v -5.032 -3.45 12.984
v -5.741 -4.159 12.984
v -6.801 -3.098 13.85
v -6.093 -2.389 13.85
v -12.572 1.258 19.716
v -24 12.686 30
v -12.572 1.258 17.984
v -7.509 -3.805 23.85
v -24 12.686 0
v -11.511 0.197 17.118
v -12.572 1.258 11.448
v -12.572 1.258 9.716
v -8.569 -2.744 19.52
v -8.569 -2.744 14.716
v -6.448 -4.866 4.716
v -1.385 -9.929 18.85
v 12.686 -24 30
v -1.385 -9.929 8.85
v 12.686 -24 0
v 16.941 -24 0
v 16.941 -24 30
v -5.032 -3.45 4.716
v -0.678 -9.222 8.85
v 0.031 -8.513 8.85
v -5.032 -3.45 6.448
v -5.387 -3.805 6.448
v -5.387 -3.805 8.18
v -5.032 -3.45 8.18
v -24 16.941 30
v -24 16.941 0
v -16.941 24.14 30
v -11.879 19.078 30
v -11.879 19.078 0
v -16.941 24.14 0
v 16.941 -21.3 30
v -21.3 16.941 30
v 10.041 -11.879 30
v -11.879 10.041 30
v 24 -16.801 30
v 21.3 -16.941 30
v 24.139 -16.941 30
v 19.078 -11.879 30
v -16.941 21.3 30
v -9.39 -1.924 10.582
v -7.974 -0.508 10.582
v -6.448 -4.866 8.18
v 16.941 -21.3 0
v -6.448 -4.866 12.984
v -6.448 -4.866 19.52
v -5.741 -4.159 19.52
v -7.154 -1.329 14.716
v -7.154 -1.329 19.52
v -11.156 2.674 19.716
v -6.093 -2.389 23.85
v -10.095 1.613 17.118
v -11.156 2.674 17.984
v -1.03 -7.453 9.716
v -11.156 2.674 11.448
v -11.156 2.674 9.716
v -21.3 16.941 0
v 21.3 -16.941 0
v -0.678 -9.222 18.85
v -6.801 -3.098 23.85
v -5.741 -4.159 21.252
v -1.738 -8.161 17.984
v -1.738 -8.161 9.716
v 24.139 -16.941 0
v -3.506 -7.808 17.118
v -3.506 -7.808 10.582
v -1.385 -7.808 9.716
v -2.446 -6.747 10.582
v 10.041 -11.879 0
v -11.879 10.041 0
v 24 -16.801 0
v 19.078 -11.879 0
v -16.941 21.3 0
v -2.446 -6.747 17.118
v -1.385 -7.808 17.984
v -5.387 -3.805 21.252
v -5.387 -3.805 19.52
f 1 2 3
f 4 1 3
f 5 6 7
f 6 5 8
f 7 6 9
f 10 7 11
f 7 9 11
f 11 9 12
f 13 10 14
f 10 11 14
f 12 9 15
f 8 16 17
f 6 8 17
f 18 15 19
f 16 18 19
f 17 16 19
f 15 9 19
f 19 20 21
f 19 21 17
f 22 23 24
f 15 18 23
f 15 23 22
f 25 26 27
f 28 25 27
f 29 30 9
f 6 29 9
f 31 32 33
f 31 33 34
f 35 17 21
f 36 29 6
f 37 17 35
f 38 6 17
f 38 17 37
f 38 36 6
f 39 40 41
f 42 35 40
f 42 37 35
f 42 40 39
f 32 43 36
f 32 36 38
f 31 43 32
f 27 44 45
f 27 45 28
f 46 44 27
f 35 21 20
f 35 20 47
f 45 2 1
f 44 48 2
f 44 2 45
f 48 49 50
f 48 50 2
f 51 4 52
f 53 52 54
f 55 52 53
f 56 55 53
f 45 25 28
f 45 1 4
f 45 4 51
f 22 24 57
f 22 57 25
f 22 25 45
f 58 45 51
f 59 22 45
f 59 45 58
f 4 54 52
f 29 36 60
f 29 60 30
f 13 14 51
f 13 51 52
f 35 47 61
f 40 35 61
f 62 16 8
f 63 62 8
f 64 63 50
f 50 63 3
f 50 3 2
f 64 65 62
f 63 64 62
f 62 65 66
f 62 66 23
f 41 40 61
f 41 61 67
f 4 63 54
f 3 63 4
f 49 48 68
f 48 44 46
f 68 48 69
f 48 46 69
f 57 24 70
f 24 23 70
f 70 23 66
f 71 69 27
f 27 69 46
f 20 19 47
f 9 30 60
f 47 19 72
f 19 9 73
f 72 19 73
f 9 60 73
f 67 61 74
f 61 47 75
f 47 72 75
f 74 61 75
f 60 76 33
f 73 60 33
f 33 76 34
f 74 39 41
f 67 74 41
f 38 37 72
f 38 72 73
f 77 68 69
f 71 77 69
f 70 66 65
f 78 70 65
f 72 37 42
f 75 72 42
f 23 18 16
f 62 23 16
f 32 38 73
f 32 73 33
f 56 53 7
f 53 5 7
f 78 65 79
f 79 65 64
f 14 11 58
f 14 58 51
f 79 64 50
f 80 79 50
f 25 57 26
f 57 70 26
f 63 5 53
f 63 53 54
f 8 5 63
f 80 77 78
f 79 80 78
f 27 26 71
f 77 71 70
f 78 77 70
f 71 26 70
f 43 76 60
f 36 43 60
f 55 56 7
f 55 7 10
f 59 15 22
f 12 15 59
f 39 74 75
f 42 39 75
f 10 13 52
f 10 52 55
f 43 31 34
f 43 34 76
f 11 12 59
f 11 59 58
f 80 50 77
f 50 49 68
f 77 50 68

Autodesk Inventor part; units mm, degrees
ref_plane "YZ Plane" through (0, 0, 0) normal (1, 0, 0) x (0, 1, 0)
ref_plane "XZ Plane" through (0, 0, 0) normal (0, 1, 0) x (-1, 0, 0)
sketch "Sketch1" plane through (0, 0, 0) normal (0, 0, 1) x (1, 0, 0)
  line L0 (-16.8009, 21.2415) -> (21.2415, -16.8009)
  line L1 (21.2415, -16.8009) -> (16.8009, -21.2415)
  line L2 (16.8009, -21.2415) -> (-21.2415, 16.8009)
  line L3 (-21.2415, 16.8009) -> (-16.8009, 21.2415)
  line L4 (-16.8009, 21.2415) -> (16.8009, -21.2415) construction
  line L5 (21.2415, -16.8009) -> (-21.2415, 16.8009) construction
  line L6 (-16.8009, 21.2415) -> (36.9991, 21.2415) construction
  line L7 (-21.2415, 16.8009) -> (-24, 16.8009)
  line L8 (16.8009, -21.2415) -> (16.8009, -24)
  line L9 (16.8009, -24) -> (-24, 16.8009)
  line L10 (-16.8009, 21.2415) -> (-16.8009, 24)
  line L11 (21.2415, -16.8009) -> (24, -16.8009)
  line L12 (24, -16.8009) -> (-16.8009, 24)
  line L13 (-24, 16.8009) -> (-24, 12.6863)
  line L14 (16.8009, -24) -> (12.6863, -24)
  line L15 (-24, 12.6863) -> (12.6863, -24)
  line L16 (-24, 16.8009) -> (-11.8721, 28.9288) construction
  line L17 (-24, 16.8009) -> (-6.8486, 16.8009) construction
  point P0 (0, 0)
  dimension "d0" = 53.8
  dimension "d1" = 45
  dimension "d2" = 6.28
  dimension "d5" = 8
  dimension "d72" = 24
  dimension "d73" = 45
extrude "Extrusion1" add sketch "Sketch1" along normal blind 30
ref_plane "Work Plane1" through (16.9, -16.9, -8) normal (-0.7071068, -0.7071068, 0) x (0, 0, 1)
sketch "Sketch7" plane through (0, 0, 30) normal (0, 0, 1) x (1, 0, 0)
  line L0 (21.2415, -16.8009) -> (24, -16.8009) projected
  line L1 (24, -16.8009) -> (-16.8009, 24) projected
  line L2 (-16.8009, 24) -> (-16.8009, 21.2415) projected
  line L3 (-16.8009, 21.2415) -> (-21.2415, 16.8009) projected
  line L4 (-21.2415, 16.8009) -> (-24, 16.8009) projected
  line L5 (-24, 16.8009) -> (-24, 12.6863) projected
  line L6 (-24, 12.6863) -> (12.6863, -24) projected
  line L7 (12.6863, -24) -> (16.8009, -24) projected
  line L8 (16.8009, -24) -> (16.8009, -21.2415) projected
  line L9 (16.8009, -21.2415) -> (21.2415, -16.8009) projected
  line L10 (3.5996, 3.5996) -> (-5.6569, -5.6569)
  line L11 (-24, 12.6863) -> (12.6863, -24) projected
  line L12 (19.0785, -2.8418) -> (10.0409, -11.8794)
  line L13 (10.0409, -11.8794) -> (-11.8794, 10.0409)
  line L14 (-11.8794, 10.0409) -> (-2.8418, 19.0785)
  line L15 (-2.8418, 19.0785) -> (19.0785, -2.8418)
  line L16 (19.0785, -2.8418) -> (-11.8794, 10.0409) construction
  line L17 (10.0409, -11.8794) -> (-2.8418, 19.0785) construction
  line L18 (-11.8794, 10.0409) -> (-11.8794, 19.0785)
  line L19 (24, -16.8009) -> (-16.8009, 24) projected
  line L20 (10.0409, -11.8794) -> (19.0785, -11.8794)
  point P0 (0, 0)
  dimension "d28" = 31
  dimension "d29" = 1.3
  dimension "d74" = 0
extrude "Extrusion7" cut sketch "Sketch7" against normal through all contours L20 L12 L1 | L12 L13 L10 L1 | L1 L14 L15 L12 | L10 L13 L14 L1 | L14 L18 L1
sketch "Sketch10" plane through (12.6863, -24, 30) normal (-0.7071068, -0.7071068, 0) x (-0.7071068, 0.7071068, 0)
  line L0 (1.6838, 16.5215) -> (7.0744, 19.4702) construction
  line L1 (7.0744, 19.4702) -> (7.0744, 10.5304) construction
  line L2 (7.0744, 10.5304) -> (1.6838, 10.5304) construction
  line L3 (1.6838, 10.5304) -> (1.6838, 6.839) construction
  line L4 (1.6838, 6.839) -> (6.7206, 6.839) construction
  line L5 (6.7206, 6.839) -> (6.7206, 1.2092) construction
  line L6 (6.7206, 1.2092) -> (1.6838, 1.2092) construction
  line L7 (1.6838, 1.2092) -> (1.6838, -3.423) construction
  line L8 (1.6838, -3.423) -> (55.1934, -3.423) construction
  line L9 (1.6838, 30.377) -> (1.6838, 26.2152) construction
  line L10 (1.6838, 26.2152) -> (7.1181, 26.2152) construction
  line L11 (7.1181, 26.2152) -> (7.1181, 20.0634) construction
  line L12 (7.1181, 20.0634) -> (1.6838, 20.0634) construction
  line L13 (1.6838, 20.0634) -> (1.6838, 16.5215) construction
  line L14 (7.0744, 15.0003) -> (55.1934, 14.9149) construction
  line L15 (1.6838, 30.377) -> (36.6838, 30.377) construction
  line L16 (36.6838, -3.423) -> (1.6838, -3.423) construction
  line L17 (19.8996, 21.1501) -> (19.8996, 11.1501)
  line L18 (19.8996, 11.1501) -> (28.5599, 6.1501)
  line L19 (19.8996, 21.1501) -> (21.3996, 20.2841)
  line L20 (21.3996, 20.2841) -> (21.3996, 12.0161)
  line L21 (21.3996, 12.0161) -> (27.0599, 8.7482)
  line L22 (27.0599, 8.7482) -> (27.0599, 17.0161)
  line L23 (27.0599, 17.0161) -> (28.5599, 16.1501)
  line L24 (28.5599, 16.1501) -> (28.5599, 6.1501)
  line L25 (51.8823, 0) -> (0, 0) construction
  line L26 (51.8823, 30) -> (51.8823, 0) construction
  line L27 (51.8823, 15) -> (0, 15) construction
  line L28 (0, 30) -> (0, 0) construction
  point P0 (25.9411, 30)
  point P1 (25.9411, 15)
  dimension "d40" = 1.5
  dimension "d41" = 1.5
  dimension "d42" = 1.5
  dimension "d43" = 10
  dimension "d44" = 10
  dimension "d75" = 8.268
  dimension "d76" = 120
emboss "Emboss1" sketch "Sketch10" operation cut depth 1 direction (0.7071068, 0.7071068, 0)
sketch "Sketch11" plane through (12.6863, -24, 30) normal (-0.7071068, -0.7071068, 0) x (-0.7071068, 0.7071068, 0)
  line L0 (21.3996, 12.0161) -> (27.0599, 8.7482) construction
  line L1 (27.0599, 8.7482) -> (27.0599, 17.0161) construction
  line L2 (27.0599, 17.0161) -> (28.5599, 16.1501) construction
  line L3 (28.5599, 16.1501) -> (28.5599, 6.1501) construction
  line L4 (28.5599, 6.1501) -> (19.8996, 11.1501) construction
  line L5 (19.8996, 11.1501) -> (19.8996, 21.1501) construction
  line L6 (19.8996, 21.1501) -> (21.3996, 20.2841) construction
  line L7 (21.3996, 20.2841) -> (21.3996, 12.0161) construction
  line L8 (0, 30) -> (51.8823, 30) construction
  line L9 (0, 30) -> (0, 0) construction
  line L10 (51.8823, 0) -> (0, 0) construction
  line L11 (51.8823, 30) -> (51.8823, 0) construction
  line L12 (9.2379, 27.3057) -> (21.3996, 20.2841) construction
  line L13 (21.3996, 20.2841) -> (21.3996, 12.0161) construction
  line L14 (21.3996, 12.0161) -> (27.0599, 8.7482) construction
  line L15 (27.0599, 8.7482) -> (27.0599, 7.4216) construction
  line L16 (27.0599, 7.4216) -> (17.8982, 13.0177) construction
  line L17 (17.8982, 13.0177) -> (17.8982, 3.0177) construction
  line L18 (17.8982, 3.0177) -> (9.2379, 8.0177) construction
  line L19 (9.2379, 8.0177) -> (9.2379, 27.3057) construction
  line L20 (15.5651, 18.4016) -> (15.5, -16.9) construction
  line L21 (15.5651, 18.4016) -> (-17.5, 16.9) construction
  line L22 (-17.5, 16.9) -> (-17.5, 12.7382) construction
  line L23 (-17.5, 12.7382) -> (-12.0658, 12.7382) construction
  line L24 (-12.0658, 12.7382) -> (-12.0658, 6.5864) construction
  line L25 (-12.0658, 6.5864) -> (-17.5, 6.5864) construction
  line L26 (-17.5, 6.5864) -> (-17.5, 3.0446) construction
  line L27 (-17.5, 3.0446) -> (-12.1095, 3.0446) construction
  line L28 (-12.1095, 3.0446) -> (-12.1095, -2.9465) construction
  line L29 (-12.1095, -2.9465) -> (-17.5, -2.9465) construction
  line L30 (-17.5, -2.9465) -> (-17.5, -6.638) construction
  line L31 (-17.5, -6.638) -> (-12.4632, -6.638) construction
  line L32 (-12.4632, -6.638) -> (-12.4632, -12.2678) construction
  line L33 (-12.4632, -12.2678) -> (-17.5, -12.2678) construction
  line L34 (-17.5, -12.2678) -> (-17.5, -16.9) construction
  line L35 (-17.5, -16.9) -> (15.5, -16.9) construction
  line L36 (-12.1095, 0.049) -> (15.5326, 0.7508) construction
  line L37 (15.5, -16.9) -> (15.5651, 18.4016) construction
  line L38 (1.91, 17.7815) -> (1.91, -16.9) construction
  line L39 (15.5, -16.9) -> (-17.5, -16.9) construction
  line L40 (27.0599, 8.7482) -> (27.0599, 7.4216) construction
  line L41 (21.3996, 20.2841) -> (21.3996, 12.0161)
  line L42 (21.3996, 12.0161) -> (27.0599, 8.7482)
  line L43 (21.3996, 20.2841) -> (21.3996, 12.0161)
  line L44 (21.3996, 12.0161) -> (27.0599, 8.7482)
  line L45 (27.0599, 8.7482) -> (27.0599, 10.4802)
  line L46 (27.0599, 8.7482) -> (27.0599, 7.4216)
  line L47 (27.0599, 10.4802) -> (22.8996, 12.8822)
  line L48 (22.8996, 12.8822) -> (22.8996, 19.4181)
  line L49 (22.8996, 19.4181) -> (27.0599, 21.82)
  line L50 (21.3996, 20.2841) -> (27.0599, 23.552)
  line L51 (27.0599, 23.552) -> (27.0599, 21.82)
  point P0 (25.9411, 30)
  point P1 (20.9754, 14.9785)
  dimension "d47" = 120
  dimension "d48" = 1.5
  dimension "d49" = 1.5
  dimension "d50" = 1.5
  dimension "d77" = 8.268
  dimension "d78" = 4.1602
  dimension "d79" = 5.6602
  dimension "d80" = 120
  dimension "d81" = 120
emboss "Emboss2" sketch "Sketch11" operation cut depth 1.5 direction (0.7071068, 0.7071068, 0)
sketch "Sketch12" plane through (12.6863, -24, 30) normal (-0.7071068, -0.7071068, 0) x (-0.7071068, 0.7071068, 0)
  line L0 (22.8996, 12.8822) -> (27.0599, 10.4802) construction
  line L1 (27.0599, 10.4802) -> (27.0599, 17.0161) construction
  line L2 (27.0599, 17.0161) -> (28.5599, 16.1501) construction
  line L3 (28.5599, 16.1501) -> (28.5599, 6.1501) construction
  line L4 (28.5599, 6.1501) -> (19.8996, 11.1501) construction
  line L5 (19.8996, 11.1501) -> (19.8996, 21.1501) construction
  line L6 (19.8996, 21.1501) -> (21.3996, 20.2841) construction
  line L7 (21.3996, 20.2841) -> (27.0599, 23.552) construction
  line L8 (27.0599, 23.552) -> (27.0599, 21.82) construction
  line L9 (27.0599, 21.82) -> (22.8996, 19.4181) construction
  line L10 (22.8996, 19.4181) -> (22.8996, 12.8822) construction
  line L11 (0, 30) -> (51.8823, 30) construction
  line L12 (0, 30) -> (0, 0) construction
  line L13 (51.8823, 0) -> (0, 0) construction
  line L14 (51.8823, 30) -> (51.8823, 0) construction
  line L15 (12.7689, 9.4432) -> (16.9291, 7.0413) construction
  line L16 (16.9291, 7.0413) -> (27.0599, 17.0161) construction
  line L17 (27.0599, 17.0161) -> (28.5599, 16.1501) construction
  line L18 (28.5599, 16.1501) -> (28.5599, 6.1501) construction
  line L19 (28.5599, 6.1501) -> (13.0911, 5.9826) construction
  line L20 (13.0911, 5.9826) -> (19.8996, 21.1501) construction
  line L21 (19.8996, 21.1501) -> (21.3996, 20.2841) construction
  line L22 (21.3996, 20.2841) -> (27.0599, 23.552) construction
  line L23 (27.0599, 23.552) -> (27.0599, 21.82) construction
  line L24 (27.0599, 21.82) -> (12.7689, 15.9791) construction
  line L25 (12.7689, 15.9791) -> (12.7689, 9.4432) construction
  line L26 (-17.5, 16.9) -> (-17.5, 12.7382) construction
  line L27 (-17.5, 12.7382) -> (-12.0658, 12.7382) construction
  line L28 (-12.0658, 12.7382) -> (-12.0658, 6.5864) construction
  line L29 (-12.0658, 6.5864) -> (-17.5, 6.5864) construction
  line L30 (-17.5, 6.5864) -> (-17.5, 3.0446) construction
  line L31 (-17.5, 3.0446) -> (-12.1095, 3.0446) construction
  line L32 (-12.1095, 3.0446) -> (-12.1095, -2.9465) construction
  line L33 (-12.1095, -2.9465) -> (-17.5, -2.9465) construction
  line L34 (-17.5, -2.9465) -> (-17.5, -6.638) construction
  line L35 (-17.5, -6.638) -> (-12.4632, -6.638) construction
  line L36 (-12.4632, -6.638) -> (-12.4632, -12.2678) construction
  line L37 (-12.4632, -12.2678) -> (-17.5, -12.2678) construction
  line L38 (-17.5, -12.2678) -> (-17.5, -16.9) construction
  line L39 (-17.5, -16.9) -> (15.5, -16.9) construction
  line L40 (21.3996, 20.2841) -> (27.0599, 23.552)
  line L41 (19.8996, 21.1501) -> (21.3996, 20.2841)
  line L42 (21.3996, 20.2841) -> (27.0599, 23.552)
  line L43 (27.0599, 23.552) -> (27.0599, 21.82)
  line L44 (27.0599, 23.552) -> (27.0599, 21.82)
  line L45 (16.9291, 7.0413) -> (27.0599, 17.0161) construction
  line L46 (19.8996, 21.1501) -> (27.0599, 25.2841)
  line L47 (27.0599, 25.2841) -> (35.7201, 20.2841)
  line L48 (35.7201, 20.2841) -> (35.7201, 18.552)
  line L49 (35.7201, 18.552) -> (30.0599, 15.2841)
  line L50 (30.0599, 15.2841) -> (30.0599, 10.4802)
  line L51 (30.0599, 10.4802) -> (34.2201, 12.8822)
  line L52 (35.7201, 10.2841) -> (35.7201, 10.2841)
  line L53 (35.7201, 10.2841) -> (28.5599, 6.1501)
  line L54 (27.0599, 17.0161) -> (28.5599, 16.1501)
  line L55 (28.5599, 6.1501) -> (28.5599, 16.1501)
  line L56 (28.5599, 16.1501) -> (27.0599, 17.0161)
  line L57 (27.0599, 21.82) -> (27.0599, 23.552)
  line L58 (28.5599, 16.1501) -> (28.5599, 6.1501)
  line L59 (27.0599, 17.0161) -> (31.2201, 19.4181)
  line L60 (31.2201, 19.4181) -> (27.0599, 21.82)
  line L61 (13.0911, 5.9826) -> (28.5599, 6.1501) construction
  line L62 (12.7689, 9.4432) -> (16.9291, 7.0413) construction
  line L63 (12.7689, 9.4432) -> (28.5599, 9.6142) construction
  line L64 (28.5599, 9.6142) -> (29.486, 10.1489) construction
  line L65 (28.5599, 16.1501) -> (35.7201, 20.2841) construction
  line L66 (28.5599, 6.1501) -> (34.2971, 9.4625) construction
  line L67 (31.2201, 19.4181) -> (35.3769, 18.7502) construction
  line L68 (27.0599, 23.552) -> (27.0599, 21.82) construction
  line L69 (35.3769, 18.7502) -> (27.0599, 23.552) construction
  line L70 (35.7201, 10.2841) -> (35.7201, 12.0161)
  line L71 (35.7201, 12.0161) -> (34.2201, 12.8822)
  line L72 (16.3223, 7.4494) -> (20.4826, 5.0475) construction
  line L73 (16.3223, 13.9853) -> (16.3223, 7.4494) construction
  line L74 (20.4826, 16.3872) -> (16.3223, 13.9853) construction
  line L75 (20.4826, 18.1193) -> (20.4826, 16.3872) construction
  line L76 (14.8223, 14.8513) -> (20.4826, 18.1193) construction
  line L77 (14.8223, 15.7065) -> (14.8223, 14.8513) construction
  line L78 (20.4826, 12.5307) -> (14.8223, 15.7065) construction
  line L79 (20.4826, 5.0475) -> (20.4826, 12.5307) construction
  line L80 (20.4826, 12.5307) -> (28.5599, 7.9987) construction
  line L81 (28.5599, 7.9987) -> (33.93, 11.0117) construction
  point P0 (25.9411, 30)
  point P1 (20.9754, 14.9785)
  dimension "d54" = 60
  dimension "d55" = 1.5
  dimension "d57" = 120
  dimension "d58" = 1.5
  dimension "d59" = 120
  dimension "d82" = 3
  dimension "d83" = 3
  dimension "d84" = 3
  dimension "d85" = 1.5
  dimension "d86" = 7.1602
  dimension "d87" = 7.1602
  dimension "d88" = 4.1602
  dimension "d89" = 1.7321
  dimension "d90" = 5.6602
  dimension "d91" = 1.7321
  dimension "d92" = 4.1602
extrude "Extrusion9" cut sketch "Sketch12" against normal blind 2
sketch "Sketch13" plane through (0, 0, 30) normal (0, 0, 1) x (1, 0, 0)
  line L0 (-11.8794, 19.0785) -> (-16.8009, 24) construction
  line L1 (-16.8009, 24) -> (-16.8009, 21.2415) projected
  line L2 (-16.8009, 21.2415) -> (-21.2415, 16.8009) projected
  line L3 (-21.2415, 16.8009) -> (-24, 16.8009) projected
  line L4 (-24, 16.8009) -> (-24, 12.6863) construction
  line L5 (-24, 12.6863) -> (12.6863, -24) construction
  line L6 (12.6863, -24) -> (16.8009, -24) construction
  line L7 (16.8009, -24) -> (16.8009, -21.2415) projected
  line L8 (16.8009, -21.2415) -> (21.2415, -16.8009) projected
  line L9 (21.2415, -16.8009) -> (24, -16.8009) projected
  line L10 (24.1, -24.6971) -> (24.1, -16.7029) construction
  line L11 (24.1, -16.7029) -> (-16.9409, 24.338) construction
  line L12 (-16.9409, 24.338) -> (-16.9409, 21.2995)
  line L13 (-16.9409, 21.2995) -> (-21.2995, 16.9409)
  line L14 (-21.2995, 16.9409) -> (-24.14, 16.9409)
  line L15 (-24.14, 16.9409) -> (-24.14, 12.6283) construction
  line L16 (-24.14, 12.6283) -> (12.6283, -24.14) construction
  line L17 (12.6283, -24.14) -> (16.9409, -24.14) construction
  line L18 (16.9409, -24.14) -> (16.9409, -21.2995)
  line L19 (16.9409, -21.2995) -> (21.2995, -16.9409)
  line L20 (21.2995, -16.9409) -> (24.2814, -16.9409)
  line L21 (24.2814, -16.9409) -> (53.8994, -46.5588) construction
  line L22 (53.8994, -46.5588) -> (45.9617, -46.5588) construction
  line L23 (45.9617, -46.5588) -> (24.1, -24.6971) construction
  line L24 (16.8009, -24) -> (16.9409, -24)
  line L25 (24, -16.8009) -> (24.1393, -16.9409)
  line L26 (-21.2415, 16.8009) -> (-22.9, 16.8009) projected
  line L27 (19.0785, -11.8794) -> (10.0409, -11.8794) projected
  line L28 (10.0409, -11.8794) -> (-11.8794, 10.0409) projected
  line L29 (-11.8794, 10.0409) -> (-11.8794, 19.0785) projected
  line L30 (24, -16.8009) -> (19.0785, -11.8794) projected
  line L31 (-24, 12.6863) -> (-24, 16.8009) projected
  line L32 (-24, 16.8009) -> (-24, 16.9409)
  line L33 (-16.8009, 24) -> (-16.9409, 24.14)
  point P0 (0, 0)
  point P1 (-22.9, 16.9409)
  dimension "d93" = 0.14
extrude "IM_offset" add sketch "Sketch13" against normal up to surface (30 mm away)
equation "\"d3\" = MirrorThickness1"
equation "\"d41\" = d40"
equation "\"d42\" = d40"
equation "\"d44\" = d43"
equation "\"d48\" = d51"
equation "\"d49\" = d51"
equation "\"d50\" = d51"
equation "\"d55\" = d60"
equation "\"d58\" = d60"
equation "\"MirrorThickness1\" = 30"
equation "\"d51\" = 1.5"
equation "\"d60\" = 1.5"
properties part number "20_Cube_Insert_Mirror_Holder_wLogo_v3"
